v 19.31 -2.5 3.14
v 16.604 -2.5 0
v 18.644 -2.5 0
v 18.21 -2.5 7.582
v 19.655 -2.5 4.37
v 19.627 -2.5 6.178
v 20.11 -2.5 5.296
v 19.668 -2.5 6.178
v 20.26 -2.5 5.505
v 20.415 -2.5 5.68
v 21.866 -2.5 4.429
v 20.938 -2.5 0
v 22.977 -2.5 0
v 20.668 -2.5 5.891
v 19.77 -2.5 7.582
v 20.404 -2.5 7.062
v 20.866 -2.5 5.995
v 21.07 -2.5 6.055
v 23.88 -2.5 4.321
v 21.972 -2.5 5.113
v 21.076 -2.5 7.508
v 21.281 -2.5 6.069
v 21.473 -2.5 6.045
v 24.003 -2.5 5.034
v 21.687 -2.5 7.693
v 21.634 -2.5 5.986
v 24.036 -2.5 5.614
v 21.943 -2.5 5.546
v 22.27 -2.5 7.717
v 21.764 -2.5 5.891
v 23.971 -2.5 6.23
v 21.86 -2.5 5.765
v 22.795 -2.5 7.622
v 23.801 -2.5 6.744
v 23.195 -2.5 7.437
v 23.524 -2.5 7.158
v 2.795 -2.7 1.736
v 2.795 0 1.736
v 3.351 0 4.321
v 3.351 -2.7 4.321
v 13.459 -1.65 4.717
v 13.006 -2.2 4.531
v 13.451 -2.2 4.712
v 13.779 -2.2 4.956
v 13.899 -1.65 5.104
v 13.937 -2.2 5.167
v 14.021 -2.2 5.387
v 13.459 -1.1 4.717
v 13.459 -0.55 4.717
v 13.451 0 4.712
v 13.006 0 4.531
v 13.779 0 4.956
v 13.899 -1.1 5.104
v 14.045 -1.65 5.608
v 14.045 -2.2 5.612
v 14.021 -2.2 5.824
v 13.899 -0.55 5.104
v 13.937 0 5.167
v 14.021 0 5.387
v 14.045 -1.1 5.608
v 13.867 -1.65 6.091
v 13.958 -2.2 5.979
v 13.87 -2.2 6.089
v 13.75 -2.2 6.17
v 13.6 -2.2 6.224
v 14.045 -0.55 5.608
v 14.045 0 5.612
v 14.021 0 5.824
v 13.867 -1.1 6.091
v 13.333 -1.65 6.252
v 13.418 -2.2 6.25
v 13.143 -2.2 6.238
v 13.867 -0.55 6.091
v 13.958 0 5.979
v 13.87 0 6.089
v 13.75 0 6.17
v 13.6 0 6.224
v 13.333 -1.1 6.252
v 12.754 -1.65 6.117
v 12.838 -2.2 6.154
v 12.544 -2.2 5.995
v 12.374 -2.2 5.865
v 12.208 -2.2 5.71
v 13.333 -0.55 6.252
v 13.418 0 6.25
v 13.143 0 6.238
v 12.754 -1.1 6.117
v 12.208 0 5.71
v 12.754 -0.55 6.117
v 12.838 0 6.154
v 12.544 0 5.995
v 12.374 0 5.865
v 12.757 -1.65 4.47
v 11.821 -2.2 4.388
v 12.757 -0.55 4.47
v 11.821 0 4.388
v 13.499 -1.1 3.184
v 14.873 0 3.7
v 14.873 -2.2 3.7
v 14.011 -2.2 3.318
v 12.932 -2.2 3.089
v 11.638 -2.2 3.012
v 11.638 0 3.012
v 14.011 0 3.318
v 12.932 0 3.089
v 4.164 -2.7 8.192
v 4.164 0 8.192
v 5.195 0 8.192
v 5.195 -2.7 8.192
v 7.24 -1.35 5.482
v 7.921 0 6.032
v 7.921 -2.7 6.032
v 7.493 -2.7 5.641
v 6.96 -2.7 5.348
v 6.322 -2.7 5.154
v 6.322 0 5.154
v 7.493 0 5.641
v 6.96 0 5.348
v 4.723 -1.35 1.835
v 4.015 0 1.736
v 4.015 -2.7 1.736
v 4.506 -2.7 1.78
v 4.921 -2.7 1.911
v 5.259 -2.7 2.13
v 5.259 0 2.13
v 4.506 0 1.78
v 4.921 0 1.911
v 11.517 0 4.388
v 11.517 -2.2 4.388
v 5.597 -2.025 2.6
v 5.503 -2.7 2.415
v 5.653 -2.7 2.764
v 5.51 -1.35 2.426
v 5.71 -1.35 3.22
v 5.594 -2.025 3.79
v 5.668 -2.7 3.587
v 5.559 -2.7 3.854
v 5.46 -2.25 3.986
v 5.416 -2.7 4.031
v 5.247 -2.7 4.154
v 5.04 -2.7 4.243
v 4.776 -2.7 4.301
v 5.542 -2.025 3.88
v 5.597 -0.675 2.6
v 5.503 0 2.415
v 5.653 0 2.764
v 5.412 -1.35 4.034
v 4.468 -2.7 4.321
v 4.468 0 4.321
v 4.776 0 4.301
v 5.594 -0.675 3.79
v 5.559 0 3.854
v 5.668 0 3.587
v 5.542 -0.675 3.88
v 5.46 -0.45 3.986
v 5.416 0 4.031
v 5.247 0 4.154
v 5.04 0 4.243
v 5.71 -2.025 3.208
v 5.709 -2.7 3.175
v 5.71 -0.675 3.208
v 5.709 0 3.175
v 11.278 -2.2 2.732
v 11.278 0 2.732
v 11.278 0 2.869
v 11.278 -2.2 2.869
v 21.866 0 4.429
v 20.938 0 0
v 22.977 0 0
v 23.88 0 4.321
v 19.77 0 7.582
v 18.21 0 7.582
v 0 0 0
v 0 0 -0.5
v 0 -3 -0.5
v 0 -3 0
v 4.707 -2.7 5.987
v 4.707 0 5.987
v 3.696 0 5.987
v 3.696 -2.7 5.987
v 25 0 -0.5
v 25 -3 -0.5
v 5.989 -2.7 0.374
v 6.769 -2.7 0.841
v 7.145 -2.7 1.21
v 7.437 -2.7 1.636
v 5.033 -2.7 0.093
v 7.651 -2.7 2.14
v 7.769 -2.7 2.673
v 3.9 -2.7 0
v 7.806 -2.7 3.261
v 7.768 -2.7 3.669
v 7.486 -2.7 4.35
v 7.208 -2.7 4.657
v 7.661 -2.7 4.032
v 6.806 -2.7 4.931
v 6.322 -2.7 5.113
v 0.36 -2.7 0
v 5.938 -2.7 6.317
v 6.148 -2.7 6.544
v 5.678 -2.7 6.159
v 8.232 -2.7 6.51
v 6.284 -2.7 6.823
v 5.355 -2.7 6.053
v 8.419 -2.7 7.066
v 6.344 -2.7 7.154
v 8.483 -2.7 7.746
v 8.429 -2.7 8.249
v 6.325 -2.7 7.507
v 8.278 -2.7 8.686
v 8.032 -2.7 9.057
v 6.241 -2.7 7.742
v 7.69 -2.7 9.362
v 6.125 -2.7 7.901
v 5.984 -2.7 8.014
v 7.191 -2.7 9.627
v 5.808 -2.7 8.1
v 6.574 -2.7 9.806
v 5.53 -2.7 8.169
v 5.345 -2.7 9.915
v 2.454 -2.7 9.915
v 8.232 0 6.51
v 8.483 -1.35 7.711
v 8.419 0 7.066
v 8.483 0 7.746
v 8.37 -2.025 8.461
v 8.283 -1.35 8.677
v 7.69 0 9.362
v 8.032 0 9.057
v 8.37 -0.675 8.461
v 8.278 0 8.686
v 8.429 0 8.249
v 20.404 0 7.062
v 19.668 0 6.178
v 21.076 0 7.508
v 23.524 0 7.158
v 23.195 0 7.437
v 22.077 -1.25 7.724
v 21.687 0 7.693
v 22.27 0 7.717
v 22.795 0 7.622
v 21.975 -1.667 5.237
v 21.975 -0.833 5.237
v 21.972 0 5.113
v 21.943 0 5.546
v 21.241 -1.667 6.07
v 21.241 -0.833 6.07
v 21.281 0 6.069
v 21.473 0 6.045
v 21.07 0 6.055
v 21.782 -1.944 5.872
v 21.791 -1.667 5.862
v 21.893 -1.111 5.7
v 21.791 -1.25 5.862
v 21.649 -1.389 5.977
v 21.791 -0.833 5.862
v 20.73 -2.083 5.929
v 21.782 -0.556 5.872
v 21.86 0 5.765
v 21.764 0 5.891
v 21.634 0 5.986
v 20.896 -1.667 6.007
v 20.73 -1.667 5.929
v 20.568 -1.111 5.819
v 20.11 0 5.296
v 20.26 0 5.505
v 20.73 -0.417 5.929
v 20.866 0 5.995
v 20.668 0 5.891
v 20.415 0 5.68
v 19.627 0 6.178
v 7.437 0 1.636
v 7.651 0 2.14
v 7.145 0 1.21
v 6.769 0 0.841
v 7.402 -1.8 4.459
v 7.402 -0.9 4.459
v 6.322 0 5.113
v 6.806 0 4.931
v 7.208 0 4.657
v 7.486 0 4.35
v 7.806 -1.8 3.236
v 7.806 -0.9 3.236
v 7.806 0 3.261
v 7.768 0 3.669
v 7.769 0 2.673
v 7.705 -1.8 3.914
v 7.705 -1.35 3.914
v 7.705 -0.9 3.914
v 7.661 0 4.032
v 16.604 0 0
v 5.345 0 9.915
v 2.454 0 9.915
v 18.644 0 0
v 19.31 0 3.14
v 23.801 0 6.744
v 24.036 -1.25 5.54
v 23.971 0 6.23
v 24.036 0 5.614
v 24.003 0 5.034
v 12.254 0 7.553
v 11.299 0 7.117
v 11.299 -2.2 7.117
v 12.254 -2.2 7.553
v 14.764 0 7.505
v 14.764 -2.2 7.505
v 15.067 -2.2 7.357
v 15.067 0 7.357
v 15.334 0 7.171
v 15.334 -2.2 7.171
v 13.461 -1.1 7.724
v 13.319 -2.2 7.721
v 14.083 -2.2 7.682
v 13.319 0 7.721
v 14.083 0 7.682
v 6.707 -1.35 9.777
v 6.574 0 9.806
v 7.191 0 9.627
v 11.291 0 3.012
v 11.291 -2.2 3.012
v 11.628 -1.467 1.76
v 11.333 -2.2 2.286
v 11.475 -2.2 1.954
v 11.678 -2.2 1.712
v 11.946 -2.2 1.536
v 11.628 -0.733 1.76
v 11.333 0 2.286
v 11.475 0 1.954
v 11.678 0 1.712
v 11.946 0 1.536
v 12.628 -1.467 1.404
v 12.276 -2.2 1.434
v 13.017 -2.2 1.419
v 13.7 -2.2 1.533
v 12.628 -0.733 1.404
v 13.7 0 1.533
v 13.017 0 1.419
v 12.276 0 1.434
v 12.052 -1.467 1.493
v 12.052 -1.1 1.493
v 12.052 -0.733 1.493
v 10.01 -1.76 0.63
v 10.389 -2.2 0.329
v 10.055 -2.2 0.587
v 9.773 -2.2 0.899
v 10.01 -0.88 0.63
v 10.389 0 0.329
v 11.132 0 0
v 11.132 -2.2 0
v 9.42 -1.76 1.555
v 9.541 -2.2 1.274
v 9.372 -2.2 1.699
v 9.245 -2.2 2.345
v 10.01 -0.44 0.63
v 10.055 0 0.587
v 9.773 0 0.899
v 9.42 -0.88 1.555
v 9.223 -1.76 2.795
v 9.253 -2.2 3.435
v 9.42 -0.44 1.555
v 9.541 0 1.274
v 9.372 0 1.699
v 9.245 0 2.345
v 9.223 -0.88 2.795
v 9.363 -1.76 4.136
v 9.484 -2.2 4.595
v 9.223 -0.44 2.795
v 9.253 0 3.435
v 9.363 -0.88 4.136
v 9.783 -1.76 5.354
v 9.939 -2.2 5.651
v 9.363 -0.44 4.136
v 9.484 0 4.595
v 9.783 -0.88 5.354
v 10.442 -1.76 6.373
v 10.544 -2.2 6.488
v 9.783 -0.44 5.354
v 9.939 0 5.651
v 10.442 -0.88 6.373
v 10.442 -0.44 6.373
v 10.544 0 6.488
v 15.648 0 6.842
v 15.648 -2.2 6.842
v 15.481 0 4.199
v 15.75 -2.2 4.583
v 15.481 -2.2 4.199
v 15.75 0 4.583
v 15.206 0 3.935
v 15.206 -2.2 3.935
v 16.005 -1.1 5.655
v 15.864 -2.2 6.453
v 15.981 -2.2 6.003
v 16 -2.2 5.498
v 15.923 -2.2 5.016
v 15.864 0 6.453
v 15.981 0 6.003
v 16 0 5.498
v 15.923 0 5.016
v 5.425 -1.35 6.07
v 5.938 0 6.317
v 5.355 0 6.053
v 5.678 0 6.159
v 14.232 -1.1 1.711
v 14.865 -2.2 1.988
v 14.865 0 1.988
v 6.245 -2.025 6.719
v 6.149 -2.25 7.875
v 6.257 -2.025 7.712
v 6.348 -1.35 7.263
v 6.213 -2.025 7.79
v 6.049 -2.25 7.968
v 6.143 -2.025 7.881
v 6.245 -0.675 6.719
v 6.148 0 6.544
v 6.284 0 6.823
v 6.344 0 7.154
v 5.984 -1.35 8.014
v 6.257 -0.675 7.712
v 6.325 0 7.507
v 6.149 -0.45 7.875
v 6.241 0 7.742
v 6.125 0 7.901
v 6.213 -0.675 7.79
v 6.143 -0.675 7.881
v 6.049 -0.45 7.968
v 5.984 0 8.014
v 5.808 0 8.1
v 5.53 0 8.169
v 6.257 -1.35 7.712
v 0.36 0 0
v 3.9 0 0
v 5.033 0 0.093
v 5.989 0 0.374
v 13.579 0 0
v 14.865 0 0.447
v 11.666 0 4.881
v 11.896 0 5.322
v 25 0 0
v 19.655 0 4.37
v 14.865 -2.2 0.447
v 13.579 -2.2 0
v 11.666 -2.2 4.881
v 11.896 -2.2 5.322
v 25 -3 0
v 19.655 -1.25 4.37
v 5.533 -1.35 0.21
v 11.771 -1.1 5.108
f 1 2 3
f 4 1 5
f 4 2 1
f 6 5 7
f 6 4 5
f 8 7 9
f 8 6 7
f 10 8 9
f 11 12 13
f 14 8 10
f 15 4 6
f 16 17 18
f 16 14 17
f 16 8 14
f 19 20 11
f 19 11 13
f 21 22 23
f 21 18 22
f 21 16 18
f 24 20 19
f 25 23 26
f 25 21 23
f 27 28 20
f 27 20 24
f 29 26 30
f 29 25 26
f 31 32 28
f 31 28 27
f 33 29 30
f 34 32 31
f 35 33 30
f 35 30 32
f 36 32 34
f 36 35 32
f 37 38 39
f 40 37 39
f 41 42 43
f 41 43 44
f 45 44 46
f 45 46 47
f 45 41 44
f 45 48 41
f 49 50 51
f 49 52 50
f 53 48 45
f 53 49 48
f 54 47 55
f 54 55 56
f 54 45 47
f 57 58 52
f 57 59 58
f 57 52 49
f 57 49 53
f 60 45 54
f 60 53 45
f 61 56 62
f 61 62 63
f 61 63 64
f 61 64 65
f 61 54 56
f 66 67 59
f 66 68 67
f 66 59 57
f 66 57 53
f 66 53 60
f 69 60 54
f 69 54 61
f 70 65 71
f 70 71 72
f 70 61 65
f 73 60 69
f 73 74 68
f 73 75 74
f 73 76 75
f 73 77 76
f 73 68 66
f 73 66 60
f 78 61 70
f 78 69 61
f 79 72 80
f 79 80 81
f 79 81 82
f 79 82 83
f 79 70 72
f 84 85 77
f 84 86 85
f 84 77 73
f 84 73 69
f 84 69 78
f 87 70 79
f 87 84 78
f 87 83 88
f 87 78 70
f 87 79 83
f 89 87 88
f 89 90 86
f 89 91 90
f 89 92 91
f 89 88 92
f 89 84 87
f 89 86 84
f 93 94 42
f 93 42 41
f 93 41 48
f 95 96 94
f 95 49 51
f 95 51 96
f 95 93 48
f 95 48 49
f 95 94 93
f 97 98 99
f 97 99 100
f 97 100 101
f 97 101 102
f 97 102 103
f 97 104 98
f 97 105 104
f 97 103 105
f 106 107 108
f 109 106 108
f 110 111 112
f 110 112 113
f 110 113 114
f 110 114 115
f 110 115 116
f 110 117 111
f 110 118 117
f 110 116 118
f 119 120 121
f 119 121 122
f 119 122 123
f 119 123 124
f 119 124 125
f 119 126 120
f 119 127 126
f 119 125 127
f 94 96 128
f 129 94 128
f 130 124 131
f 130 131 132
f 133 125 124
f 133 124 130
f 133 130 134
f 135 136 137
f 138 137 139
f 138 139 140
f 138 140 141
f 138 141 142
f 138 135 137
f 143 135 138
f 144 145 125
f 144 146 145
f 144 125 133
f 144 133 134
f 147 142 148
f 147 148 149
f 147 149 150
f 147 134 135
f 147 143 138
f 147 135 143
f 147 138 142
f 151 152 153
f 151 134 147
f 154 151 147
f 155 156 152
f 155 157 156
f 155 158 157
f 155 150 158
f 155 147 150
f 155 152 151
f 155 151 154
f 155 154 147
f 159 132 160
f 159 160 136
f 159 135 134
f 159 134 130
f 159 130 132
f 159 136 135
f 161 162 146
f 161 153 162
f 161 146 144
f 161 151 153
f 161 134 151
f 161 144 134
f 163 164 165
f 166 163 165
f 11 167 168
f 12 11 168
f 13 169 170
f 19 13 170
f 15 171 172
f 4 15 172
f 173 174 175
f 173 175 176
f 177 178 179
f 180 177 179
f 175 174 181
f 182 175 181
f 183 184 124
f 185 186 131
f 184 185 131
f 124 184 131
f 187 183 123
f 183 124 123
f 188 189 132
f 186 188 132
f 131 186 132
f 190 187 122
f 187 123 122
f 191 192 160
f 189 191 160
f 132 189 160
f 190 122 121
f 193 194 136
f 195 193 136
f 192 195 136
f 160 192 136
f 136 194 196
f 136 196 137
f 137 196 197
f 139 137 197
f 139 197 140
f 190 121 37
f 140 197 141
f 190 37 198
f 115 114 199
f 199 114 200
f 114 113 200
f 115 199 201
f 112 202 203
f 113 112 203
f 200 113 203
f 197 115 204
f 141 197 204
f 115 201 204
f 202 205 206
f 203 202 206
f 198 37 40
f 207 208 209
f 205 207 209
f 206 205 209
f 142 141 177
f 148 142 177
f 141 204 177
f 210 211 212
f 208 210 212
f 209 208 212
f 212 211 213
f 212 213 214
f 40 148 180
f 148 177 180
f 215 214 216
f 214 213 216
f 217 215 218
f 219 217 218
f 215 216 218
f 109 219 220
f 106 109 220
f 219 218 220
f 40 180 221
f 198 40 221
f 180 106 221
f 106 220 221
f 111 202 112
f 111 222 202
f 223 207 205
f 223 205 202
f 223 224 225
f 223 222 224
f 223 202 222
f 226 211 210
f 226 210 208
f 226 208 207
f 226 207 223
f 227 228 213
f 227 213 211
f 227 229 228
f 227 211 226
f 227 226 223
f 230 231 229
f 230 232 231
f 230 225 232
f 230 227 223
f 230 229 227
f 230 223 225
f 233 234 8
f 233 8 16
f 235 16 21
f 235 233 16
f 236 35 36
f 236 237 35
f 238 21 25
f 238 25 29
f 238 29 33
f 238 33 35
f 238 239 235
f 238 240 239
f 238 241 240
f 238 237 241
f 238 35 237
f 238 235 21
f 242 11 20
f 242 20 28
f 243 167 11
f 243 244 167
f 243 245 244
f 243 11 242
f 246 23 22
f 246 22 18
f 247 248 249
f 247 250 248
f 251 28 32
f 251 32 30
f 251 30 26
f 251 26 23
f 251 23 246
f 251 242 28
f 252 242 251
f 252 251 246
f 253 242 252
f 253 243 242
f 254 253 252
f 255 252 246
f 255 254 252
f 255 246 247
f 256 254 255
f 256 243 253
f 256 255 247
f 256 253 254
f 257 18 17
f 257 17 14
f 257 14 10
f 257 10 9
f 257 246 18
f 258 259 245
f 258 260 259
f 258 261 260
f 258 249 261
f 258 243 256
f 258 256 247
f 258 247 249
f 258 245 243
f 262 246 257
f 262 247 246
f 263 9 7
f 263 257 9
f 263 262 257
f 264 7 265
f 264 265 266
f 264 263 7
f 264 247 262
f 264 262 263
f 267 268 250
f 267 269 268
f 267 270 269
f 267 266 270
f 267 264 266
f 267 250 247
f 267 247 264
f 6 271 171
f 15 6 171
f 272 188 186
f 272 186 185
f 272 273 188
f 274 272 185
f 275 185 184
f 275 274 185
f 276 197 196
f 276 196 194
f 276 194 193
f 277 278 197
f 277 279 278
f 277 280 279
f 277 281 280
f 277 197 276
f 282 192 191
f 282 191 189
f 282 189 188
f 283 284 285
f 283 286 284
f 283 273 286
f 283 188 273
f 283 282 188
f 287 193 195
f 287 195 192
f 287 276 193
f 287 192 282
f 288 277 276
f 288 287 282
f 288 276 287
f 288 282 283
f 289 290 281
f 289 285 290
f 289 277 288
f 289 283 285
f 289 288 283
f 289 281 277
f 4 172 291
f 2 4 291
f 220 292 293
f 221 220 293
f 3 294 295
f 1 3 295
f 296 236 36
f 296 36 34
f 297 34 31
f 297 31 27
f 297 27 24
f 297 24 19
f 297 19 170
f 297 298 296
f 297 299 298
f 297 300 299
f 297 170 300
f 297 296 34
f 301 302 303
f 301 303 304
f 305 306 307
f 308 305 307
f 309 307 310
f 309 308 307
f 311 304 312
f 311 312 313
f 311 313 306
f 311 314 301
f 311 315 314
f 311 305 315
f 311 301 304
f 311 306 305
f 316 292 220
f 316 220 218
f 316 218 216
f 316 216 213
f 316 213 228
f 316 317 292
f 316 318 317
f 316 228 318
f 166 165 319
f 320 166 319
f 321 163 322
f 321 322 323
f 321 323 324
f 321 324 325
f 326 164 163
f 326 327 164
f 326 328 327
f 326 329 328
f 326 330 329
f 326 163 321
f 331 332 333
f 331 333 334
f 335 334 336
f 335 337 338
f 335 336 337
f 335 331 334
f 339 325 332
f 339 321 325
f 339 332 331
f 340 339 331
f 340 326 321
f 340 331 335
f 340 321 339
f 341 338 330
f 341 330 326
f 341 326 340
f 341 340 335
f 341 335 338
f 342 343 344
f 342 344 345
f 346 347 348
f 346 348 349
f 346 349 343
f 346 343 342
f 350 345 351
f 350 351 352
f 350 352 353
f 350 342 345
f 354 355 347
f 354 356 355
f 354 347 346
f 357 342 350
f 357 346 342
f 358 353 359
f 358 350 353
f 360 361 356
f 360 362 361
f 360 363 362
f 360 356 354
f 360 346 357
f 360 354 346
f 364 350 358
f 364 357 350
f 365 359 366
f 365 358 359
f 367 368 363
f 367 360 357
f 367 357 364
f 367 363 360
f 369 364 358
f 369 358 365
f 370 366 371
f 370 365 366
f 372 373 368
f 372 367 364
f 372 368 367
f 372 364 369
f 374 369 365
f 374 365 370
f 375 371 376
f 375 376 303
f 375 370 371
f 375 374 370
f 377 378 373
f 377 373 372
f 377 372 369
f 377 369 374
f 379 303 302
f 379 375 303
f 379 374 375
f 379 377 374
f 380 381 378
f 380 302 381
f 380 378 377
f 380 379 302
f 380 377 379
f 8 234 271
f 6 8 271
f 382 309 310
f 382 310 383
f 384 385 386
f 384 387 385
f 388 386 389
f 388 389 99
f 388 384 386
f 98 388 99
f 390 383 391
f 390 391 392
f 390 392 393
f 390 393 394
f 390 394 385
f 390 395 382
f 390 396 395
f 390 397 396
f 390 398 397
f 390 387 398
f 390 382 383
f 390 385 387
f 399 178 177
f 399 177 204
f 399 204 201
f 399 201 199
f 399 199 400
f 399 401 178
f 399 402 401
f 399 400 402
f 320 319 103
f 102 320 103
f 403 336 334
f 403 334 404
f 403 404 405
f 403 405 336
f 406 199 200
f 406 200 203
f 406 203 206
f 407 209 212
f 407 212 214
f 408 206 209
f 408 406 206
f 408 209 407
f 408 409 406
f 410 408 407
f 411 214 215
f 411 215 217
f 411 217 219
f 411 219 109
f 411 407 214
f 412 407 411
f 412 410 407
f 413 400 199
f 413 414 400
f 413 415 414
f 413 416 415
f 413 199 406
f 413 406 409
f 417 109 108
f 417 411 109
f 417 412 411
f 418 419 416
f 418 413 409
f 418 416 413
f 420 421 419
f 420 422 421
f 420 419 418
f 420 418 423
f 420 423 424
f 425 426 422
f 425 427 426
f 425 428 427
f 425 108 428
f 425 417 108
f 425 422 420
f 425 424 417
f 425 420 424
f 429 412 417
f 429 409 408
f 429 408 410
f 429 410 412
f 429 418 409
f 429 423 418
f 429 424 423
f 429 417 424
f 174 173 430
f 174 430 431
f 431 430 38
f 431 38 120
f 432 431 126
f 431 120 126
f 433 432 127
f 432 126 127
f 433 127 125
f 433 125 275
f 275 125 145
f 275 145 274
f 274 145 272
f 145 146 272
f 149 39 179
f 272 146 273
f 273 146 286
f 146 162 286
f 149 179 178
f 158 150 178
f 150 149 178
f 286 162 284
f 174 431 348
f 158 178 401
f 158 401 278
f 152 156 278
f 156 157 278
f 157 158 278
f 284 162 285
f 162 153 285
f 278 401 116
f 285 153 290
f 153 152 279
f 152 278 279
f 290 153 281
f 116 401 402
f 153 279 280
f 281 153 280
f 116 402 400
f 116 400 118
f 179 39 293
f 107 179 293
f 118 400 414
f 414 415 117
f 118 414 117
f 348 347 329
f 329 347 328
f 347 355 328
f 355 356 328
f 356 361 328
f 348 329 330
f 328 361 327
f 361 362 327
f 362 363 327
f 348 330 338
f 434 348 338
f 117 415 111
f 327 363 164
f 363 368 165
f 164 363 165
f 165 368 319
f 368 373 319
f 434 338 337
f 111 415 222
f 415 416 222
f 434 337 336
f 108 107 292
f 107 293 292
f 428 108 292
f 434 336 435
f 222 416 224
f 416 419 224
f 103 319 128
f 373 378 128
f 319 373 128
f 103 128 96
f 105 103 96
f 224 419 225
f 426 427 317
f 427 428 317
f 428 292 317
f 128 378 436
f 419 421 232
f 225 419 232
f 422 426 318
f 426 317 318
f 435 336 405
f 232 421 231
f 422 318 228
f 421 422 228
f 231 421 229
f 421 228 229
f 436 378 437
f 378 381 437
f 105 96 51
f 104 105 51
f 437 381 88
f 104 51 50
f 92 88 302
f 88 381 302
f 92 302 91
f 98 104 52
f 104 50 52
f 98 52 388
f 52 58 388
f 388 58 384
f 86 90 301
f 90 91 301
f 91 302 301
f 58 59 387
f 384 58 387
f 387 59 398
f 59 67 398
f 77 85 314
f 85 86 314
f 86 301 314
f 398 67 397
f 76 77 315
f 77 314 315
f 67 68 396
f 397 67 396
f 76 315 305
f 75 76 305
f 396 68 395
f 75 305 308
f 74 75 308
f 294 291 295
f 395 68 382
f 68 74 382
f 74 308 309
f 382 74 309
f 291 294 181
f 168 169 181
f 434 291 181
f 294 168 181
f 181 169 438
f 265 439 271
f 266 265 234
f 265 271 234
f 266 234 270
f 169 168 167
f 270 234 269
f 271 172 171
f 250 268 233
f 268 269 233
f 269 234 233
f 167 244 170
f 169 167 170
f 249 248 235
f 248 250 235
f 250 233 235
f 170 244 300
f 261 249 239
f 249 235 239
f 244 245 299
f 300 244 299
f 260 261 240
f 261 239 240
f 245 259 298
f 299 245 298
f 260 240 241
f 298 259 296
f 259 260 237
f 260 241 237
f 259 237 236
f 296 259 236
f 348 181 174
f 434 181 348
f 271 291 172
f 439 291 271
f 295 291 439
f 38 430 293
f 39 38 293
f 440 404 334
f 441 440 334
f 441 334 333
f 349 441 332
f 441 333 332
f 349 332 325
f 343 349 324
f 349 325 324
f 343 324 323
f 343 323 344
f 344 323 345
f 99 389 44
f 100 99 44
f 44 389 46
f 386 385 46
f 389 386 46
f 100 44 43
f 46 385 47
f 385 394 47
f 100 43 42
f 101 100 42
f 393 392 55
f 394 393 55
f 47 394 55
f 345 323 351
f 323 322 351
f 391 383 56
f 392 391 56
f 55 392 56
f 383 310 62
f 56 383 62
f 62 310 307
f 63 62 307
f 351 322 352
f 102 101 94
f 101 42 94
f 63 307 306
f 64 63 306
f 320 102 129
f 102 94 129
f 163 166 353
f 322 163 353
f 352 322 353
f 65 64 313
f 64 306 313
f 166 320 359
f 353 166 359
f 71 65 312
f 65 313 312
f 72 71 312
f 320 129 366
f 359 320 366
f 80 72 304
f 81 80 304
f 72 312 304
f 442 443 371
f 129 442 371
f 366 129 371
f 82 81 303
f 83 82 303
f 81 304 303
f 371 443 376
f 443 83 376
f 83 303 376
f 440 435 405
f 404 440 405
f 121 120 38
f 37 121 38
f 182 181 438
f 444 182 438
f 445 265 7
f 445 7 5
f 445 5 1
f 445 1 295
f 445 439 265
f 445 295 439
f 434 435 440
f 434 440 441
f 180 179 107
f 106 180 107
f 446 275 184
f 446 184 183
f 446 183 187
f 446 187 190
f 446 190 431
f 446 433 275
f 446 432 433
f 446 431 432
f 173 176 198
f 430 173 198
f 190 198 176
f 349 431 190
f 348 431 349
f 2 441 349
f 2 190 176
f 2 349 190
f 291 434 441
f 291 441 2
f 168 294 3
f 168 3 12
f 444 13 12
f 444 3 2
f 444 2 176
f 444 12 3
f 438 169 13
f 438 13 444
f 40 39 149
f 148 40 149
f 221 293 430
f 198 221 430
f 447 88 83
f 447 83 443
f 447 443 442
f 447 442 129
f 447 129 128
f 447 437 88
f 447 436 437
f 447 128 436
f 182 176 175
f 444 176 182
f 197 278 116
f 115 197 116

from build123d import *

# Parameters (mm, degrees)
F1_DEPTH = 2.7
F2_DEPTH = 2.2
F3_DEPTH = 2.5
F4_W     = 25
F4_H     = 0.5
F5_DEPTH = 3


with BuildPart() as f1:
    # F0 (on Front) → F1 (new body)
    with BuildSketch(Plane.XZ):
        with BuildLine():
            add(Edge.make_bspline(
                [(5.3450520833, 9.9153645833), (6.8967013889, 9.9153645833), (7.6898871528, 9.3619791667)],
                knots=[0, 0, 0, 1, 1, 1], degree=2))
            Line((5.3450520833, 9.9153645833), (2.4544270833, 9.9153645833))
            Line((2.4544270833, 9.9153645833), (0.3602430556, 0))
            Line((0.3602430556, 0), (3.8997395833, 0))
            add(Edge.make_bspline(
                [(6.7686631944, 0.8409288194), (5.7313368056, 0), (3.8997395833, 0)],
                knots=[0, 0, 0, 1, 1, 1], degree=2))
            add(Edge.make_bspline(
                [(7.8059895833, 3.2356770833), (7.8059895833, 1.6818576389), (6.7686631944, 0.8409288194)],
                knots=[0, 0, 0, 1, 1, 1], degree=2))
            add(Edge.make_bspline(
                [(7.40234375, 4.4585503472), (7.8059895833, 3.9800347222), (7.8059895833, 3.2356770833)],
                knots=[0, 0, 0, 1, 1, 1], degree=2))
            add(Edge.make_bspline(
                [(6.3216145833, 5.1128472222), (6.9986979167, 4.9370659722), (7.40234375, 4.4585503472)],
                knots=[0, 0, 0, 1, 1, 1], degree=2))
            Line((6.3216145833, 5.1128472222), (6.3216145833, 5.1540798611))
            add(Edge.make_bspline(
                [(7.9210069444, 6.0319010417), (7.3589409722, 5.37109375), (6.3216145833, 5.1540798611)],
                knots=[0, 0, 0, 1, 1, 1], degree=2))
            add(Edge.make_bspline(
                [(8.4830729167, 7.7105034722), (8.4830729167, 6.6927083333), (7.9210069444, 6.0319010417)],
                knots=[0, 0, 0, 1, 1, 1], degree=2))
            add(Edge.make_bspline(
                [(7.6898871528, 9.3619791667), (8.4830729167, 8.80859375), (8.4830729167, 7.7105034722)],
                knots=[0, 0, 0, 1, 1, 1], degree=2))
        make_face()
        with BuildLine():
            Line((4.0147569444, 1.7361111111), (2.7951388889, 1.7361111111))
            Line((2.7951388889, 1.7361111111), (3.3506944444, 4.3207465278))
            Line((3.3506944444, 4.3207465278), (4.4683159722, 4.3207465278))
            add(Edge.make_bspline(
                [(5.7096354167, 3.2204861111), (5.7096354167, 4.3207465278), (4.4683159722, 4.3207465278)],
                knots=[0, 0, 0, 1, 1, 1], degree=2))
            add(Edge.make_bspline(
                [(5.2593315972, 2.1299913194), (5.7096354167, 2.5238715278), (5.7096354167, 3.2204861111)],
                knots=[0, 0, 0, 1, 1, 1], degree=2))
            add(Edge.make_bspline(
                [(4.0147569444, 1.7361111111), (4.8090277778, 1.7361111111), (5.2593315972, 2.1299913194)],
                knots=[0, 0, 0, 1, 1, 1], degree=2))
        make_face(mode=Mode.SUBTRACT)
        with BuildLine():
            Line((4.70703125, 5.9874131944), (3.6957465278, 5.9874131944))
            Line((3.6957465278, 5.9874131944), (4.1644965278, 8.1922743056))
            Line((4.1644965278, 8.1922743056), (5.1953125, 8.1922743056))
            add(Edge.make_bspline(
                [(6.34765625, 7.2634548611), (6.34765625, 8.1922743056), (5.1953125, 8.1922743056)],
                knots=[0, 0, 0, 1, 1, 1], degree=2))
            add(Edge.make_bspline(
                [(5.9375, 6.3172743056), (6.34765625, 6.6471354167), (6.34765625, 7.2634548611)],
                knots=[0, 0, 0, 1, 1, 1], degree=2))
            add(Edge.make_bspline(
                [(4.70703125, 5.9874131944), (5.52734375, 5.9874131944), (5.9375, 6.3172743056)],
                knots=[0, 0, 0, 1, 1, 1], degree=2))
        make_face(mode=Mode.SUBTRACT)
    extrude(amount=F1_DEPTH)



with BuildPart() as f2:
    # F0 (on Front) → F2 (new body)
    with BuildSketch(Plane.XZ):
        with BuildLine():
            add(Edge.make_bspline(
                [(12.2222222222, -0.13671875), (10.7964409722, -0.13671875), (10.009765625, 0.6304253472)],
                knots=[0, 0, 0, 1, 1, 1], degree=2))
            add(Edge.make_bspline(
                [(14.8654513889, 0.4470486111), (13.7000868056, -0.13671875), (12.2222222222, -0.13671875)],
                knots=[0, 0, 0, 1, 1, 1], degree=2))
            Line((14.8654513889, 0.4470486111), (14.8654513889, 1.9878472222))
            add(Edge.make_bspline(
                [(13.7000868056, 1.533203125), (14.1818576389, 1.6623263889), (14.8654513889, 1.9878472222)],
                knots=[0, 0, 0, 1, 1, 1], degree=2))
            add(Edge.make_bspline(
                [(12.6280381944, 1.4040798611), (13.2183159722, 1.4040798611), (13.7000868056, 1.533203125)],
                knots=[0, 0, 0, 1, 1, 1], degree=2))
            add(Edge.make_bspline(
                [(11.6276041667, 1.7599826389), (11.9769965278, 1.4040798611), (12.6280381944, 1.4040798611)],
                knots=[0, 0, 0, 1, 1, 1], degree=2))
            add(Edge.make_bspline(
                [(11.2782118056, 2.7322048611), (11.2782118056, 2.1158854167), (11.6276041667, 1.7599826389)],
                knots=[0, 0, 0, 1, 1, 1], degree=2))
            Line((11.2782118056, 2.7322048611), (11.2782118056, 2.8689236111))
            Line((11.2782118056, 2.8689236111), (11.2912326389, 3.0121527778))
            Line((11.2912326389, 3.0121527778), (11.6384548611, 3.0121527778))
            add(Edge.make_bspline(
                [(14.873046875, 3.7000868056), (13.7413194444, 3.0121527778), (11.6384548611, 3.0121527778)],
                knots=[0, 0, 0, 1, 1, 1], degree=2))
            add(Edge.make_bspline(
                [(16.0047743056, 5.6553819444), (16.0047743056, 4.3880208333), (14.873046875, 3.7000868056)],
                knots=[0, 0, 0, 1, 1, 1], degree=2))
            add(Edge.make_bspline(
                [(15.3342013889, 7.1712239583), (16.0047743056, 6.6189236111), (16.0047743056, 5.6553819444)],
                knots=[0, 0, 0, 1, 1, 1], degree=2))
            add(Edge.make_bspline(
                [(13.4613715278, 7.7235243056), (14.6636284722, 7.7235243056), (15.3342013889, 7.1712239583)],
                knots=[0, 0, 0, 1, 1, 1], degree=2))
            add(Edge.make_bspline(
                [(11.298828125, 7.1169704861), (12.2547743056, 7.7235243056), (13.4613715278, 7.7235243056)],
                knots=[0, 0, 0, 1, 1, 1], degree=2))
            add(Edge.make_bspline(
                [(9.7829861111, 5.3537326389), (10.3428819444, 6.5104166667), (11.298828125, 7.1169704861)],
                knots=[0, 0, 0, 1, 1, 1], degree=2))
            add(Edge.make_bspline(
                [(9.2230902778, 2.7951388889), (9.2230902778, 4.1970486111), (9.7829861111, 5.3537326389)],
                knots=[0, 0, 0, 1, 1, 1], degree=2))
            add(Edge.make_bspline(
                [(10.009765625, 0.6304253472), (9.2230902778, 1.3975694444), (9.2230902778, 2.7951388889)],
                knots=[0, 0, 0, 1, 1, 1], degree=2))
        make_face()
        with BuildLine():
            add(Edge.make_bspline(
                [(13.3333333333, 6.2521701389), (12.7365451389, 6.2521701389), (12.2081163194, 5.7096354167)],
                knots=[0, 0, 0, 1, 1, 1], degree=2))
            add(Edge.make_bspline(
                [(14.0451388889, 5.6076388889), (14.0451388889, 6.2521701389), (13.3333333333, 6.2521701389)],
                knots=[0, 0, 0, 1, 1, 1], degree=2))
            add(Edge.make_bspline(
                [(13.4592013889, 4.716796875), (14.0451388889, 5.0455729167), (14.0451388889, 5.6076388889)],
                knots=[0, 0, 0, 1, 1, 1], degree=2))
            add(Edge.make_bspline(
                [(11.8207465278, 4.3880208333), (12.8732638889, 4.3880208333), (13.4592013889, 4.716796875)],
                knots=[0, 0, 0, 1, 1, 1], degree=2))
            Line((11.8207465278, 4.3880208333), (11.5169270833, 4.3880208333))
            add(Edge.make_bspline(
                [(12.2081163194, 5.7096354167), (11.6796875, 5.1671006944), (11.5169270833, 4.3880208333)],
                knots=[0, 0, 0, 1, 1, 1], degree=2))
        make_face(mode=Mode.SUBTRACT)
    extrude(amount=F2_DEPTH)


with BuildPart() as f3:
    # F0 (on Front) → F3 (new body)
    with BuildSketch(Plane.XZ):
        with BuildLine():
            Line((20.9375, 0), (22.9774305556, 0))
            Line((22.9774305556, 0), (23.8802083333, 4.3207465278))
            add(Edge.make_bspline(
                [(24.0364583333, 5.5403645833), (24.0364583333, 5.0455729167), (23.8802083333, 4.3207465278)],
                knots=[0, 0, 0, 1, 1, 1], degree=2))
            add(Edge.make_bspline(
                [(23.5243055556, 7.158203125), (24.0364583333, 6.5928819444), (24.0364583333, 5.5403645833)],
                knots=[0, 0, 0, 1, 1, 1], degree=2))
            add(Edge.make_bspline(
                [(22.0768229167, 7.7235243056), (23.0121527778, 7.7235243056), (23.5243055556, 7.158203125)],
                knots=[0, 0, 0, 1, 1, 1], degree=2))
            add(Edge.make_bspline(
                [(19.66796875, 6.1783854167), (20.6575520833, 7.7235243056), (22.0768229167, 7.7235243056)],
                knots=[0, 0, 0, 1, 1, 1], degree=2))
            Line((19.66796875, 6.1783854167), (19.6267361111, 6.1783854167))
            Line((19.6267361111, 6.1783854167), (19.7699652778, 7.5824652778))
            Line((19.7699652778, 7.5824652778), (18.2096354167, 7.5824652778))
            Line((18.2096354167, 7.5824652778), (16.6037326389, 0))
            Line((16.6037326389, 0), (18.6436631944, 0))
            Line((18.6436631944, 0), (19.3098958333, 3.1401909722))
            add(Edge.make_bspline(
                [(20.1095920139, 5.2962239583), (19.6006944444, 4.5225694444), (19.3098958333, 3.1401909722)],
                knots=[0, 0, 0, 1, 1, 1], degree=2))
            add(Edge.make_bspline(
                [(21.2413194444, 6.0698784722), (20.6184895833, 6.0698784722), (20.1095920139, 5.2962239583)],
                knots=[0, 0, 0, 1, 1, 1], degree=2))
            add(Edge.make_bspline(
                [(21.9748263889, 5.2365451389), (21.9748263889, 6.0698784722), (21.2413194444, 6.0698784722)],
                knots=[0, 0, 0, 1, 1, 1], degree=2))
            add(Edge.make_bspline(
                [(21.8663194444, 4.4292534722), (21.9748263889, 4.8893229167), (21.9748263889, 5.2365451389)],
                knots=[0, 0, 0, 1, 1, 1], degree=2))
            Line((21.8663194444, 4.4292534722), (20.9375, 0))
        make_face()
    extrude(amount=F3_DEPTH)


with BuildPart() as f1_1:
    add(f1.part)

    add(f2.part)  # F5 merges F2

    add(f3.part)  # F5 merges F3
    # F4 (on Front) → F5 (join)
    with BuildSketch(Plane.XZ):
        with Locations((12.5, -0.25)):
            Rectangle(F4_W, F4_H)
    extrude(amount=F5_DEPTH)


solid = f1_1.part
